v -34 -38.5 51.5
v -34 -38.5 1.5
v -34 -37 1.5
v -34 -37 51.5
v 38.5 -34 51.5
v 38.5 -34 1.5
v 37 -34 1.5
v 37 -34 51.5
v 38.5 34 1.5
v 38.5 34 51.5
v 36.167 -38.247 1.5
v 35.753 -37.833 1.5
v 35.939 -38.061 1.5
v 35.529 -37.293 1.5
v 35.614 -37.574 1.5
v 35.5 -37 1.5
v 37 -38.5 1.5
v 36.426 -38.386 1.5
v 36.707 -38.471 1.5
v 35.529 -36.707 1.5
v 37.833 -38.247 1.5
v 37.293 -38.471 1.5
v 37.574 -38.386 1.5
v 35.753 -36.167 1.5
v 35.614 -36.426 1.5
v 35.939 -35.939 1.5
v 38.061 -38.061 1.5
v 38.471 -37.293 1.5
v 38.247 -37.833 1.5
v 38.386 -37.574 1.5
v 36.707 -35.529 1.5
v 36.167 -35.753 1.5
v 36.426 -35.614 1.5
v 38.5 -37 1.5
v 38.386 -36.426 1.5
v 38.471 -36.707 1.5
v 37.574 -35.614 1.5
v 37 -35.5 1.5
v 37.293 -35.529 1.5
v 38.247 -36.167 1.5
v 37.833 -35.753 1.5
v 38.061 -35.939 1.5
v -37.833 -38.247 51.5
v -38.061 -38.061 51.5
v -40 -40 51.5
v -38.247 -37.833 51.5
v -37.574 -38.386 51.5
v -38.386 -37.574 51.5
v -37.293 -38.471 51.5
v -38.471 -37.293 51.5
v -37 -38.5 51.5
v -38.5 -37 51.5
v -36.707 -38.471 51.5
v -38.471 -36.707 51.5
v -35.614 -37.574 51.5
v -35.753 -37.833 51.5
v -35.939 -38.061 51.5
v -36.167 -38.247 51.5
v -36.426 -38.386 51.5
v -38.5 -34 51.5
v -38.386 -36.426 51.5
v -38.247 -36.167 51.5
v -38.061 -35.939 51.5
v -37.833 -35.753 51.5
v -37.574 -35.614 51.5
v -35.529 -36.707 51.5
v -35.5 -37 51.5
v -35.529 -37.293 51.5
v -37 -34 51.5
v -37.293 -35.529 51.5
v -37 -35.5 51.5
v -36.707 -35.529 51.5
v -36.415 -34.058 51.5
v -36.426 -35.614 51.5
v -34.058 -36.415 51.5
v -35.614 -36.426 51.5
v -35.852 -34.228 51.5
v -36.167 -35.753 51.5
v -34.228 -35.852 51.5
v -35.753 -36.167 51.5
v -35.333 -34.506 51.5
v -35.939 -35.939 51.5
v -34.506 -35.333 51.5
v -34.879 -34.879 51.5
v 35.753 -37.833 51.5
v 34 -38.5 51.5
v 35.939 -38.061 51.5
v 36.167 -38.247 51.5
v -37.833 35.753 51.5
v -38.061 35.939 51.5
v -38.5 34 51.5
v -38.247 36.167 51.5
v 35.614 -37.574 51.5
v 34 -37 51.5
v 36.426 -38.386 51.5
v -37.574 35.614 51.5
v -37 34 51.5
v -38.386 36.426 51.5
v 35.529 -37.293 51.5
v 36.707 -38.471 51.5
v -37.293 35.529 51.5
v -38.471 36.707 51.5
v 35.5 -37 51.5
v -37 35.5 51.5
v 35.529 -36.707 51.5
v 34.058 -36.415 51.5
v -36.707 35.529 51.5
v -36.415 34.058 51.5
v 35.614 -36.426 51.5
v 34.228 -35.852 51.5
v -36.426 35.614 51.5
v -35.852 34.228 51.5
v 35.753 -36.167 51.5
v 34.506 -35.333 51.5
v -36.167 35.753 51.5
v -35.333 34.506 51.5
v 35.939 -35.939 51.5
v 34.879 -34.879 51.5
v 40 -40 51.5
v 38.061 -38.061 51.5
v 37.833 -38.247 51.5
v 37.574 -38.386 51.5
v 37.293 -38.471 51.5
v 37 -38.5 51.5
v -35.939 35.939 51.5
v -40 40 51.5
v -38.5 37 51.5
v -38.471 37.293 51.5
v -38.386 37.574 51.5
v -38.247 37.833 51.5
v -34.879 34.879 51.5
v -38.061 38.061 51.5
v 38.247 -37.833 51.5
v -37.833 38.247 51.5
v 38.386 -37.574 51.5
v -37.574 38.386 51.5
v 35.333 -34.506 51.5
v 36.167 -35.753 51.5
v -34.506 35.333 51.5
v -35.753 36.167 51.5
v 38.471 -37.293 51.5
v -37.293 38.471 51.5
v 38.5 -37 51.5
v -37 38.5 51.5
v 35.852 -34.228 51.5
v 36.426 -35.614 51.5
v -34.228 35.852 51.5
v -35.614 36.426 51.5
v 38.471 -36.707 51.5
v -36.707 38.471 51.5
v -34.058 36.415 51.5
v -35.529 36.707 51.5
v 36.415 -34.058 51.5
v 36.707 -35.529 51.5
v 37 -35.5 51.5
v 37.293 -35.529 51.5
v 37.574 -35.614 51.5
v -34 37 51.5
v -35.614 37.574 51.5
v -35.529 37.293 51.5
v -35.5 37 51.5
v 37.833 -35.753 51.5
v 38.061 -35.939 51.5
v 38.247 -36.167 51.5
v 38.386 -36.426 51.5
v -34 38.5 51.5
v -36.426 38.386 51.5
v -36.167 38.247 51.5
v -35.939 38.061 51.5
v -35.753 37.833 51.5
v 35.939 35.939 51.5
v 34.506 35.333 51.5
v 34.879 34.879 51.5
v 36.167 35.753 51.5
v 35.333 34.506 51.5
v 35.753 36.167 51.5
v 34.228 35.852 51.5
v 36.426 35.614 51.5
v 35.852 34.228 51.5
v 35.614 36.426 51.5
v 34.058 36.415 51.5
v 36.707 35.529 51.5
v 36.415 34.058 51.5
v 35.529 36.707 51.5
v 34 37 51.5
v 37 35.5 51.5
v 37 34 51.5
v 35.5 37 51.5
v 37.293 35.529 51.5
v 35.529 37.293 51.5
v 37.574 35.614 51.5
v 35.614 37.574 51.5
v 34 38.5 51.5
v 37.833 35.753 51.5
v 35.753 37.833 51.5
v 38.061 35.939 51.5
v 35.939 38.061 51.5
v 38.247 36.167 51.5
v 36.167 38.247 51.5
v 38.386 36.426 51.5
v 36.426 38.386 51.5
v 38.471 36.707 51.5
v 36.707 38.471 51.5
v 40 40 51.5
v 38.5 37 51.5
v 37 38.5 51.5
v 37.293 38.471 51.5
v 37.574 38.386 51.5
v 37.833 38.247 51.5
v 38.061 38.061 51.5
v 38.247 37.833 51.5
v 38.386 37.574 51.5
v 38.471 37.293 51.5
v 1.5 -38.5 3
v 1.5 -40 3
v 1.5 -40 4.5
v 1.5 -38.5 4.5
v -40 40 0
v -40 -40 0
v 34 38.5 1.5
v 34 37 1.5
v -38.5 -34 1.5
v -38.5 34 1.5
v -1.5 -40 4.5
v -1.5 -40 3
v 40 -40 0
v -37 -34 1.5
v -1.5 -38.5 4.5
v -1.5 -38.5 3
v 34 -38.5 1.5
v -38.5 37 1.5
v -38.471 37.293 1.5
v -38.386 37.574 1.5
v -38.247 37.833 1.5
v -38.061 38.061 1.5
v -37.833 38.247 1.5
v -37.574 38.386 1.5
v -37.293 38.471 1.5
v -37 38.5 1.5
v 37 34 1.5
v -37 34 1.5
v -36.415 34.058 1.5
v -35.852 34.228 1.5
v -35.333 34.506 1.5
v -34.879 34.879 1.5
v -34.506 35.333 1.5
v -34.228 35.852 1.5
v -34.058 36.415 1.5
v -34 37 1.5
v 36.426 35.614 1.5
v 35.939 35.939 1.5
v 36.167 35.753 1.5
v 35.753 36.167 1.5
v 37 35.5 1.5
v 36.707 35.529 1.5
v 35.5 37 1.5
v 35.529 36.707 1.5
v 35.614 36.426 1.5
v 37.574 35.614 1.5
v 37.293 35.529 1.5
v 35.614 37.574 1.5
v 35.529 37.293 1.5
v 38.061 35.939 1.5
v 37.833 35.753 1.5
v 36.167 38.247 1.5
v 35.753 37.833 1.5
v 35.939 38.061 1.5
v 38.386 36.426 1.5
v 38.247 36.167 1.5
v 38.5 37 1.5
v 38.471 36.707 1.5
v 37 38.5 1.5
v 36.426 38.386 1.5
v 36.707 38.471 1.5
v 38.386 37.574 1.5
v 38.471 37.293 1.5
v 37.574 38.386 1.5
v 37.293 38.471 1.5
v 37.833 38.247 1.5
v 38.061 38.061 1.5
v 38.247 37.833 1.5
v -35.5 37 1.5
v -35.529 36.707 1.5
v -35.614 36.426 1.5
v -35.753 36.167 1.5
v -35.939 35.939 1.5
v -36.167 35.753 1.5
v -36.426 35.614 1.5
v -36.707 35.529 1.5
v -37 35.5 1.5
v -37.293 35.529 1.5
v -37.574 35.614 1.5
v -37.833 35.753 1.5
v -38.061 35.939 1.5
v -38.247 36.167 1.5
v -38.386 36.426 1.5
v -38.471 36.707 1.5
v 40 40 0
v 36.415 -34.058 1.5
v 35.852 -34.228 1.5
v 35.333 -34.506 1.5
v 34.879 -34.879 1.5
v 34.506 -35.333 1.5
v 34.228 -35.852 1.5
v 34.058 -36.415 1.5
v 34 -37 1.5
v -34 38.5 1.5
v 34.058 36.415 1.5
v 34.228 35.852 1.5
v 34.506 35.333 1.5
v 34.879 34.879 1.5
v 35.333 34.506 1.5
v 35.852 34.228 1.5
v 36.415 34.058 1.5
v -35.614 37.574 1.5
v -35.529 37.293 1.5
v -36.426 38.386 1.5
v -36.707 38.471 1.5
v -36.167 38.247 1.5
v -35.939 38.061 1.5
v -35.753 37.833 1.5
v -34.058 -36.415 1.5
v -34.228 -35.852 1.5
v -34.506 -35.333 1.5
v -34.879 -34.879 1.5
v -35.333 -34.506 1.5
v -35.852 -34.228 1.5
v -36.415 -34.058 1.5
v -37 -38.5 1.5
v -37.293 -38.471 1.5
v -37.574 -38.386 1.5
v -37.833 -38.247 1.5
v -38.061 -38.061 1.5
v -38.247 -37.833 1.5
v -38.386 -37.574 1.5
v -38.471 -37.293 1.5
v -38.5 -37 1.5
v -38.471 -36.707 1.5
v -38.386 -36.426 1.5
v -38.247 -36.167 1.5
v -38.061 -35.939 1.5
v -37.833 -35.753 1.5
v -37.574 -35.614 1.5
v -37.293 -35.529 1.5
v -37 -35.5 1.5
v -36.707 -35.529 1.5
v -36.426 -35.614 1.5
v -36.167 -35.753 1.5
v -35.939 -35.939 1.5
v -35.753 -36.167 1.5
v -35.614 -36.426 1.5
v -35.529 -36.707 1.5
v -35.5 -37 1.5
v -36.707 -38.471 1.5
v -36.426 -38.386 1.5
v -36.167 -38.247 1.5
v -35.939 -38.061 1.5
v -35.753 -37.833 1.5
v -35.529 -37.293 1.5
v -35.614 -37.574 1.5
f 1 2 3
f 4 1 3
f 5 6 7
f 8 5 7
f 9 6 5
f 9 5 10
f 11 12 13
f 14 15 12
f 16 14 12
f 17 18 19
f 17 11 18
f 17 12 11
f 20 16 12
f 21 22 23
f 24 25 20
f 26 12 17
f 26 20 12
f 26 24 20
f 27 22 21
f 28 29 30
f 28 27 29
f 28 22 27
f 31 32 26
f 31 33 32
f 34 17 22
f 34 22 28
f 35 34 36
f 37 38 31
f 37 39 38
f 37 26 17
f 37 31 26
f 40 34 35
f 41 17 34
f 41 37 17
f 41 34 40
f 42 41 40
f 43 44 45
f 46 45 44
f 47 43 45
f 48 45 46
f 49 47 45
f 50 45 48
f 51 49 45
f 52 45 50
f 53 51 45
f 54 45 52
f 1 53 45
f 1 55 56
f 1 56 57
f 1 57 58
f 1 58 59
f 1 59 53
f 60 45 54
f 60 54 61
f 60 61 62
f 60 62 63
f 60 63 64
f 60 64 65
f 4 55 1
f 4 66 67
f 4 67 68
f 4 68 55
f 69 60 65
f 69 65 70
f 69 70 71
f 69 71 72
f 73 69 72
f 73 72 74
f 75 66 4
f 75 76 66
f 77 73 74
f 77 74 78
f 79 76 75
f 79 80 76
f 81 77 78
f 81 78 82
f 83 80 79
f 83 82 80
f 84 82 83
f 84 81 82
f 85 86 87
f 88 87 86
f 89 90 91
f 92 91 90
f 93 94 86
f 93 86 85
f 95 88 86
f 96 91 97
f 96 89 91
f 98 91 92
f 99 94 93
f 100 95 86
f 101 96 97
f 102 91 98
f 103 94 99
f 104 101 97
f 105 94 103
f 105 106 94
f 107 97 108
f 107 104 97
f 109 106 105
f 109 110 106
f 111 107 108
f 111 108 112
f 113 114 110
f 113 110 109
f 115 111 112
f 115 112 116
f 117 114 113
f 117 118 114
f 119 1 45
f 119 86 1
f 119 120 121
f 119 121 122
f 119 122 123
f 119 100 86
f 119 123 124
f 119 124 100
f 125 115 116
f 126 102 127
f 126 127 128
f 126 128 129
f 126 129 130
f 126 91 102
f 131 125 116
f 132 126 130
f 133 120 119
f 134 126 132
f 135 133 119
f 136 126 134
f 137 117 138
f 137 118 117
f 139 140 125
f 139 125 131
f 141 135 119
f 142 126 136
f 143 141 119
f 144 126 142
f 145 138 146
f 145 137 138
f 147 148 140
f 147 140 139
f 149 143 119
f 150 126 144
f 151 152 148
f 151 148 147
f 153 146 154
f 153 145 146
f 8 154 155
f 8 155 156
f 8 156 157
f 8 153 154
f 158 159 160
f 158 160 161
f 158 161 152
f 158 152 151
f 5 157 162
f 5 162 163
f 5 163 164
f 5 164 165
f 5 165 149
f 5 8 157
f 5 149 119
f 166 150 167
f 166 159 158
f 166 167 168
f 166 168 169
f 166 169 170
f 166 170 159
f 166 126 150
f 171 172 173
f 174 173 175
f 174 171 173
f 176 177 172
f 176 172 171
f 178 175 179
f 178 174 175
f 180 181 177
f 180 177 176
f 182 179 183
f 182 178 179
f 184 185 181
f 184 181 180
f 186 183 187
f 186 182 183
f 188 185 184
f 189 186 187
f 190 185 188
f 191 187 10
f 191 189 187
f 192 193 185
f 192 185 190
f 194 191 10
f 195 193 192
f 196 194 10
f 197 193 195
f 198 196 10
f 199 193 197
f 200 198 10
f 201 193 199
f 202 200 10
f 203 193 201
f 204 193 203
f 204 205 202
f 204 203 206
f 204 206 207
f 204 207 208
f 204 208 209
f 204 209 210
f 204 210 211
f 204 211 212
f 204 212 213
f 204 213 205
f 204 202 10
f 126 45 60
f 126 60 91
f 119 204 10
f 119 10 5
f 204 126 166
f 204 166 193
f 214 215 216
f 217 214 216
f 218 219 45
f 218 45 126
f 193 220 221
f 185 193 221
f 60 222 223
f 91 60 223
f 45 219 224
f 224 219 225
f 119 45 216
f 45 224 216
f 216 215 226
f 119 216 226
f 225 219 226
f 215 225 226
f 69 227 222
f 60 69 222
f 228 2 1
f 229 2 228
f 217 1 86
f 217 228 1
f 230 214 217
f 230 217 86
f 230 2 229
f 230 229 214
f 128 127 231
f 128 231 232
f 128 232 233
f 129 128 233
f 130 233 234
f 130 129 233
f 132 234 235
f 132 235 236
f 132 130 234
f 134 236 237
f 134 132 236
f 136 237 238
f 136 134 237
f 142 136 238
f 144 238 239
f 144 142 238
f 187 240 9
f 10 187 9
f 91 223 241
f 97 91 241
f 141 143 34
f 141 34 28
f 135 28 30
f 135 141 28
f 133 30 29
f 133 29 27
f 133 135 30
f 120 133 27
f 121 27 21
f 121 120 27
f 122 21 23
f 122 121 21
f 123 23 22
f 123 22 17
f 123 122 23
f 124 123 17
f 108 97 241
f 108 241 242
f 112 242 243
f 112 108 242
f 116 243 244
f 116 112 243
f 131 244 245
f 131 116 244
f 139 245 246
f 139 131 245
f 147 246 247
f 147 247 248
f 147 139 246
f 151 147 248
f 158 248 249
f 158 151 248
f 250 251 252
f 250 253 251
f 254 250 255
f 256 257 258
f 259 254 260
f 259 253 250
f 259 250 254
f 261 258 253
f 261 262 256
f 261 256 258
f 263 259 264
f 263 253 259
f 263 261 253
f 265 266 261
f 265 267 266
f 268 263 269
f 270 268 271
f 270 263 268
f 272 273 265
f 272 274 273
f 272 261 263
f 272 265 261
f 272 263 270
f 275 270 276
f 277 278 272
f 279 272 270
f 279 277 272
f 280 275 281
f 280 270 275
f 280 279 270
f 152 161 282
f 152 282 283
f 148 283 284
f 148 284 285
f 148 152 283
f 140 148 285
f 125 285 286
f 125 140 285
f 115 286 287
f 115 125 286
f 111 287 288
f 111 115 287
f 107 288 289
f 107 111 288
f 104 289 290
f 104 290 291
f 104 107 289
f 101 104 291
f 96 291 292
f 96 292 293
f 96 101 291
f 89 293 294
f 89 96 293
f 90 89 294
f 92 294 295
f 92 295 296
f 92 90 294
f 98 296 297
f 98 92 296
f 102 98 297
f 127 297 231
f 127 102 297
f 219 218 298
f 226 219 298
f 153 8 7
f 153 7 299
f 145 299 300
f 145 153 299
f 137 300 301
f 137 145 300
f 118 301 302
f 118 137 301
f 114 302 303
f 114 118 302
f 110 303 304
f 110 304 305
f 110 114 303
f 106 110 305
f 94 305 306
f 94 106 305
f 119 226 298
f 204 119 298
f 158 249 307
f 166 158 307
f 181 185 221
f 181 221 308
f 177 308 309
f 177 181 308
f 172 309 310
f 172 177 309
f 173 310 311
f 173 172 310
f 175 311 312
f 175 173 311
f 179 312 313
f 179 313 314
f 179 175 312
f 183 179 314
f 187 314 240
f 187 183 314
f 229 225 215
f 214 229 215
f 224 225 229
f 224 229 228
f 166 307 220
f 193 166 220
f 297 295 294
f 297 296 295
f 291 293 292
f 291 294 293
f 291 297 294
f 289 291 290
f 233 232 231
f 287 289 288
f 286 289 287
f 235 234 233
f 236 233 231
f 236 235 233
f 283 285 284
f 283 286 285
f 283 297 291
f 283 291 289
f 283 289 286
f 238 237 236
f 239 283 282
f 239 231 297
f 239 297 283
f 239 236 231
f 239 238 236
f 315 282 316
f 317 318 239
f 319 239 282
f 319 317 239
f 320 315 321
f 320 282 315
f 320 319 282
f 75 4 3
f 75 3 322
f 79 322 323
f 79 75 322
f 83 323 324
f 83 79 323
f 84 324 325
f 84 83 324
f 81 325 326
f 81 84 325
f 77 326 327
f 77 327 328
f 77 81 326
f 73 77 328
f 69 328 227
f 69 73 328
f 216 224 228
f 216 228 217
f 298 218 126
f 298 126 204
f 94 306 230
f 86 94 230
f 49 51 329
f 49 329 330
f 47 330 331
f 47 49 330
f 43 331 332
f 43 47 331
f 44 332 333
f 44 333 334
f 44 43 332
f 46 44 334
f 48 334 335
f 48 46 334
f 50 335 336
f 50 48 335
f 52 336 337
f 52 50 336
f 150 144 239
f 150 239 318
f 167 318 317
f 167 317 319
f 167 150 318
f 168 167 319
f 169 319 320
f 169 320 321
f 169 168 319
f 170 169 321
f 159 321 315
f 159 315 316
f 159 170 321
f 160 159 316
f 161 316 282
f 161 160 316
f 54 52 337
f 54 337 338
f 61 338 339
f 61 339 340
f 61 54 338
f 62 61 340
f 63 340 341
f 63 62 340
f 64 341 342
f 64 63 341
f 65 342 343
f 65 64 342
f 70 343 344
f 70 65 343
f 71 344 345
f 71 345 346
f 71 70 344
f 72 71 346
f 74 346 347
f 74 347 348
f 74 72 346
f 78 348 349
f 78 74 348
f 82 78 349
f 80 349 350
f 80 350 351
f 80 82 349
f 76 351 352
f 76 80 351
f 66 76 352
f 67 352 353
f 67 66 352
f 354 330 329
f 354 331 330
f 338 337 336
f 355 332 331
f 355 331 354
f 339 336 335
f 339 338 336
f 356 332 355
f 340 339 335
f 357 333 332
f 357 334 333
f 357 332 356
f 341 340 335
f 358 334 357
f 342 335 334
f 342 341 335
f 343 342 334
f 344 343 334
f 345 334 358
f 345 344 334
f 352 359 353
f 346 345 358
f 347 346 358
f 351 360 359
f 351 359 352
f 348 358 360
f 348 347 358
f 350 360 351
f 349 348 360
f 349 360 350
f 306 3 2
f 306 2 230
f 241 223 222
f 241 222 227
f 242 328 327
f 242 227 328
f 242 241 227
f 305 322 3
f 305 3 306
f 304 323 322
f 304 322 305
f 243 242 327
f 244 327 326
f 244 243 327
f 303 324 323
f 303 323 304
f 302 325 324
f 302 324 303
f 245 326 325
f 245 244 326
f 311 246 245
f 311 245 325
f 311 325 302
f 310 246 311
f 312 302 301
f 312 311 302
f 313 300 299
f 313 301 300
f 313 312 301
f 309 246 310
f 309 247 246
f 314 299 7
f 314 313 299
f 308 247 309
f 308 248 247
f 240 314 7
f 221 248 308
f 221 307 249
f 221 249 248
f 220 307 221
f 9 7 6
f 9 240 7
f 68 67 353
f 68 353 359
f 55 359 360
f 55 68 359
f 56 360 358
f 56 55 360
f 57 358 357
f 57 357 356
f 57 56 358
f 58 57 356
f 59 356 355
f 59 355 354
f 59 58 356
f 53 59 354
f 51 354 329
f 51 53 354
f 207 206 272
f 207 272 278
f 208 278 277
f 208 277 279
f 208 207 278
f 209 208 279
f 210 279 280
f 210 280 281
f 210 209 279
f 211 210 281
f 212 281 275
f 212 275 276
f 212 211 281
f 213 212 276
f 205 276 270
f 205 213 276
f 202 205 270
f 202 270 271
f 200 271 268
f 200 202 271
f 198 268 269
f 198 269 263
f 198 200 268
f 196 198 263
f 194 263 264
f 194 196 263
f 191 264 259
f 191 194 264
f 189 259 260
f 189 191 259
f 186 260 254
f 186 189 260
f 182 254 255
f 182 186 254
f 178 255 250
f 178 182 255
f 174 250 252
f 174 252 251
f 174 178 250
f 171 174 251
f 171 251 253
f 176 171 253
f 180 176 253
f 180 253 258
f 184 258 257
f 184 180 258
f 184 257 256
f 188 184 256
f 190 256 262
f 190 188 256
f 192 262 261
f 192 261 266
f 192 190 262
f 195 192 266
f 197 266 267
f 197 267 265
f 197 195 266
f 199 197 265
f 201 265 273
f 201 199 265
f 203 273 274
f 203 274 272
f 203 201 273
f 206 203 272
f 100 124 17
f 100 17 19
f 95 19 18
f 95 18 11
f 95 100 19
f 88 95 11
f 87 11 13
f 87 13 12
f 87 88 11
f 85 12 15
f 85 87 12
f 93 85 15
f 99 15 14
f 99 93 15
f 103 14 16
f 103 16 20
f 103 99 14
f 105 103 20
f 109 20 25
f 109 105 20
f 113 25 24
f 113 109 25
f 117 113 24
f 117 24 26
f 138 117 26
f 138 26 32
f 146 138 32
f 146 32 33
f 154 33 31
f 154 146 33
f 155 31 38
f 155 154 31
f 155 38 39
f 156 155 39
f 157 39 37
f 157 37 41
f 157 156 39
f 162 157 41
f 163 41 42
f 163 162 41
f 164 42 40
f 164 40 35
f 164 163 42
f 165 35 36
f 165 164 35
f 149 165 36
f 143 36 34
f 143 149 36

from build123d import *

# Parameters (mm, degrees)
F0_W     = 80
F0_H     = 80
F1_DEPTH = 51.5
F2_T     = -1.5
F4_DEPTH = 50
F5_W     = 3
F5_H     = 1.5
F6_DEPTH = 1.5


with BuildPart() as f1:
    # F0 (on Top) → F1 (new body)
    with BuildSketch(Plane.XY):
        Rectangle(F0_W, F0_H)
    extrude(amount=F1_DEPTH)

    # F2
    f2_openings = [f1.faces().sort_by_distance(p)[0] for p in [
        (0, 0, 51.5),
    ]]
    offset(amount=F2_T, openings=f2_openings)

    # F3 (on face) → F4 (join, through all)
    with BuildSketch(Plane.XY.offset(51.5)):
        with BuildLine():
            ThreePointArc((-36.9999999833, 38.5), (-35.9393398223, 38.0606601659), (-35.5, 37))
            ThreePointArc((-35.5, 37), (-37, 35.5), (-38.5, 37))
            Line((-38.5, 37), (-38.5, 34))
            Line((-38.5, 34), (-37, 34))
            ThreePointArc((-37, 34), (-34.8786796564, 34.8786796564), (-34, 37))
            Line((-34, 37), (-34, 38.5))
            Line((-34, 38.5), (-36.9999999833, 38.5))
        make_face()
        with BuildLine():
            ThreePointArc((-38.5, 37), (-38.0606601659, 38.0606601777), (-36.9999999833, 38.5))
            Line((-36.9999999833, 38.5), (-38.5, 38.5))
            Line((-38.5, 38.5), (-38.5, 37))
        make_face()
        with BuildLine():
            Line((-37, -34), (-38.5, -34))
            Line((-38.5, -34), (-38.5, -37))
            ThreePointArc((-38.5, -37), (-37, -35.5), (-35.5, -37))
            ThreePointArc((-35.5, -37), (-35.9393398378, -38.0606601813), (-37.0000000271, -38.5))
            Line((-37.0000000271, -38.5), (-34, -38.5))
            Line((-34, -38.5), (-34, -37))
            ThreePointArc((-34, -37), (-34.8786796564, -34.8786796564), (-37, -34))
        make_face()
        with BuildLine():
            ThreePointArc((-37.0000000271, -38.5), (-38.0606601813, -38.0606601622), (-38.5, -37))
            Line((-38.5, -37), (-38.5, -38.5))
            Line((-38.5, -38.5), (-37.0000000271, -38.5))
        make_face()
        with BuildLine():
            Line((38.5, -37), (38.5, -34))
            Line((38.5, -34), (37, -34))
            ThreePointArc((37, -34), (34.8786796564, -34.8786796564), (34, -37))
            Line((34, -37), (34, -38.5))
            Line((34, -38.5), (37, -38.5))
            ThreePointArc((37, -38.5), (35.9393398282, -35.9393398282), (38.5, -37))
        make_face()
        with BuildLine():
            Line((38.5, -38.5), (38.5, -37))
            ThreePointArc((38.5, -37), (38.0606601718, -38.0606601718), (37, -38.5))
            Line((37, -38.5), (38.5, -38.5))
        make_face()
        with BuildLine():
            Line((37.0000000167, 38.5), (34, 38.5))
            Line((34, 38.5), (34, 37))
            ThreePointArc((34, 37), (34.8786796564, 34.8786796564), (37, 34))
            Line((37, 34), (38.5, 34))
            Line((38.5, 34), (38.5, 37))
            ThreePointArc((38.5, 37), (35.9393398223, 35.9393398341), (37.0000000167, 38.5))
        make_face()
        with BuildLine():
            Line((38.5, 38.5), (37.0000000167, 38.5))
            ThreePointArc((37.0000000167, 38.5), (38.0606601777, 38.0606601659), (38.5, 37))
            Line((38.5, 37), (38.5, 38.5))
        make_face()
    extrude(amount=-F4_DEPTH)

    # F5 (on face) → F6 (cut, through all)
    with BuildSketch(Plane.XZ.offset(40)):
        with Locations((0, 3.75)):
            Rectangle(F5_W, F5_H)
    extrude(amount=-F6_DEPTH, mode=Mode.SUBTRACT)


solid = f1.part
